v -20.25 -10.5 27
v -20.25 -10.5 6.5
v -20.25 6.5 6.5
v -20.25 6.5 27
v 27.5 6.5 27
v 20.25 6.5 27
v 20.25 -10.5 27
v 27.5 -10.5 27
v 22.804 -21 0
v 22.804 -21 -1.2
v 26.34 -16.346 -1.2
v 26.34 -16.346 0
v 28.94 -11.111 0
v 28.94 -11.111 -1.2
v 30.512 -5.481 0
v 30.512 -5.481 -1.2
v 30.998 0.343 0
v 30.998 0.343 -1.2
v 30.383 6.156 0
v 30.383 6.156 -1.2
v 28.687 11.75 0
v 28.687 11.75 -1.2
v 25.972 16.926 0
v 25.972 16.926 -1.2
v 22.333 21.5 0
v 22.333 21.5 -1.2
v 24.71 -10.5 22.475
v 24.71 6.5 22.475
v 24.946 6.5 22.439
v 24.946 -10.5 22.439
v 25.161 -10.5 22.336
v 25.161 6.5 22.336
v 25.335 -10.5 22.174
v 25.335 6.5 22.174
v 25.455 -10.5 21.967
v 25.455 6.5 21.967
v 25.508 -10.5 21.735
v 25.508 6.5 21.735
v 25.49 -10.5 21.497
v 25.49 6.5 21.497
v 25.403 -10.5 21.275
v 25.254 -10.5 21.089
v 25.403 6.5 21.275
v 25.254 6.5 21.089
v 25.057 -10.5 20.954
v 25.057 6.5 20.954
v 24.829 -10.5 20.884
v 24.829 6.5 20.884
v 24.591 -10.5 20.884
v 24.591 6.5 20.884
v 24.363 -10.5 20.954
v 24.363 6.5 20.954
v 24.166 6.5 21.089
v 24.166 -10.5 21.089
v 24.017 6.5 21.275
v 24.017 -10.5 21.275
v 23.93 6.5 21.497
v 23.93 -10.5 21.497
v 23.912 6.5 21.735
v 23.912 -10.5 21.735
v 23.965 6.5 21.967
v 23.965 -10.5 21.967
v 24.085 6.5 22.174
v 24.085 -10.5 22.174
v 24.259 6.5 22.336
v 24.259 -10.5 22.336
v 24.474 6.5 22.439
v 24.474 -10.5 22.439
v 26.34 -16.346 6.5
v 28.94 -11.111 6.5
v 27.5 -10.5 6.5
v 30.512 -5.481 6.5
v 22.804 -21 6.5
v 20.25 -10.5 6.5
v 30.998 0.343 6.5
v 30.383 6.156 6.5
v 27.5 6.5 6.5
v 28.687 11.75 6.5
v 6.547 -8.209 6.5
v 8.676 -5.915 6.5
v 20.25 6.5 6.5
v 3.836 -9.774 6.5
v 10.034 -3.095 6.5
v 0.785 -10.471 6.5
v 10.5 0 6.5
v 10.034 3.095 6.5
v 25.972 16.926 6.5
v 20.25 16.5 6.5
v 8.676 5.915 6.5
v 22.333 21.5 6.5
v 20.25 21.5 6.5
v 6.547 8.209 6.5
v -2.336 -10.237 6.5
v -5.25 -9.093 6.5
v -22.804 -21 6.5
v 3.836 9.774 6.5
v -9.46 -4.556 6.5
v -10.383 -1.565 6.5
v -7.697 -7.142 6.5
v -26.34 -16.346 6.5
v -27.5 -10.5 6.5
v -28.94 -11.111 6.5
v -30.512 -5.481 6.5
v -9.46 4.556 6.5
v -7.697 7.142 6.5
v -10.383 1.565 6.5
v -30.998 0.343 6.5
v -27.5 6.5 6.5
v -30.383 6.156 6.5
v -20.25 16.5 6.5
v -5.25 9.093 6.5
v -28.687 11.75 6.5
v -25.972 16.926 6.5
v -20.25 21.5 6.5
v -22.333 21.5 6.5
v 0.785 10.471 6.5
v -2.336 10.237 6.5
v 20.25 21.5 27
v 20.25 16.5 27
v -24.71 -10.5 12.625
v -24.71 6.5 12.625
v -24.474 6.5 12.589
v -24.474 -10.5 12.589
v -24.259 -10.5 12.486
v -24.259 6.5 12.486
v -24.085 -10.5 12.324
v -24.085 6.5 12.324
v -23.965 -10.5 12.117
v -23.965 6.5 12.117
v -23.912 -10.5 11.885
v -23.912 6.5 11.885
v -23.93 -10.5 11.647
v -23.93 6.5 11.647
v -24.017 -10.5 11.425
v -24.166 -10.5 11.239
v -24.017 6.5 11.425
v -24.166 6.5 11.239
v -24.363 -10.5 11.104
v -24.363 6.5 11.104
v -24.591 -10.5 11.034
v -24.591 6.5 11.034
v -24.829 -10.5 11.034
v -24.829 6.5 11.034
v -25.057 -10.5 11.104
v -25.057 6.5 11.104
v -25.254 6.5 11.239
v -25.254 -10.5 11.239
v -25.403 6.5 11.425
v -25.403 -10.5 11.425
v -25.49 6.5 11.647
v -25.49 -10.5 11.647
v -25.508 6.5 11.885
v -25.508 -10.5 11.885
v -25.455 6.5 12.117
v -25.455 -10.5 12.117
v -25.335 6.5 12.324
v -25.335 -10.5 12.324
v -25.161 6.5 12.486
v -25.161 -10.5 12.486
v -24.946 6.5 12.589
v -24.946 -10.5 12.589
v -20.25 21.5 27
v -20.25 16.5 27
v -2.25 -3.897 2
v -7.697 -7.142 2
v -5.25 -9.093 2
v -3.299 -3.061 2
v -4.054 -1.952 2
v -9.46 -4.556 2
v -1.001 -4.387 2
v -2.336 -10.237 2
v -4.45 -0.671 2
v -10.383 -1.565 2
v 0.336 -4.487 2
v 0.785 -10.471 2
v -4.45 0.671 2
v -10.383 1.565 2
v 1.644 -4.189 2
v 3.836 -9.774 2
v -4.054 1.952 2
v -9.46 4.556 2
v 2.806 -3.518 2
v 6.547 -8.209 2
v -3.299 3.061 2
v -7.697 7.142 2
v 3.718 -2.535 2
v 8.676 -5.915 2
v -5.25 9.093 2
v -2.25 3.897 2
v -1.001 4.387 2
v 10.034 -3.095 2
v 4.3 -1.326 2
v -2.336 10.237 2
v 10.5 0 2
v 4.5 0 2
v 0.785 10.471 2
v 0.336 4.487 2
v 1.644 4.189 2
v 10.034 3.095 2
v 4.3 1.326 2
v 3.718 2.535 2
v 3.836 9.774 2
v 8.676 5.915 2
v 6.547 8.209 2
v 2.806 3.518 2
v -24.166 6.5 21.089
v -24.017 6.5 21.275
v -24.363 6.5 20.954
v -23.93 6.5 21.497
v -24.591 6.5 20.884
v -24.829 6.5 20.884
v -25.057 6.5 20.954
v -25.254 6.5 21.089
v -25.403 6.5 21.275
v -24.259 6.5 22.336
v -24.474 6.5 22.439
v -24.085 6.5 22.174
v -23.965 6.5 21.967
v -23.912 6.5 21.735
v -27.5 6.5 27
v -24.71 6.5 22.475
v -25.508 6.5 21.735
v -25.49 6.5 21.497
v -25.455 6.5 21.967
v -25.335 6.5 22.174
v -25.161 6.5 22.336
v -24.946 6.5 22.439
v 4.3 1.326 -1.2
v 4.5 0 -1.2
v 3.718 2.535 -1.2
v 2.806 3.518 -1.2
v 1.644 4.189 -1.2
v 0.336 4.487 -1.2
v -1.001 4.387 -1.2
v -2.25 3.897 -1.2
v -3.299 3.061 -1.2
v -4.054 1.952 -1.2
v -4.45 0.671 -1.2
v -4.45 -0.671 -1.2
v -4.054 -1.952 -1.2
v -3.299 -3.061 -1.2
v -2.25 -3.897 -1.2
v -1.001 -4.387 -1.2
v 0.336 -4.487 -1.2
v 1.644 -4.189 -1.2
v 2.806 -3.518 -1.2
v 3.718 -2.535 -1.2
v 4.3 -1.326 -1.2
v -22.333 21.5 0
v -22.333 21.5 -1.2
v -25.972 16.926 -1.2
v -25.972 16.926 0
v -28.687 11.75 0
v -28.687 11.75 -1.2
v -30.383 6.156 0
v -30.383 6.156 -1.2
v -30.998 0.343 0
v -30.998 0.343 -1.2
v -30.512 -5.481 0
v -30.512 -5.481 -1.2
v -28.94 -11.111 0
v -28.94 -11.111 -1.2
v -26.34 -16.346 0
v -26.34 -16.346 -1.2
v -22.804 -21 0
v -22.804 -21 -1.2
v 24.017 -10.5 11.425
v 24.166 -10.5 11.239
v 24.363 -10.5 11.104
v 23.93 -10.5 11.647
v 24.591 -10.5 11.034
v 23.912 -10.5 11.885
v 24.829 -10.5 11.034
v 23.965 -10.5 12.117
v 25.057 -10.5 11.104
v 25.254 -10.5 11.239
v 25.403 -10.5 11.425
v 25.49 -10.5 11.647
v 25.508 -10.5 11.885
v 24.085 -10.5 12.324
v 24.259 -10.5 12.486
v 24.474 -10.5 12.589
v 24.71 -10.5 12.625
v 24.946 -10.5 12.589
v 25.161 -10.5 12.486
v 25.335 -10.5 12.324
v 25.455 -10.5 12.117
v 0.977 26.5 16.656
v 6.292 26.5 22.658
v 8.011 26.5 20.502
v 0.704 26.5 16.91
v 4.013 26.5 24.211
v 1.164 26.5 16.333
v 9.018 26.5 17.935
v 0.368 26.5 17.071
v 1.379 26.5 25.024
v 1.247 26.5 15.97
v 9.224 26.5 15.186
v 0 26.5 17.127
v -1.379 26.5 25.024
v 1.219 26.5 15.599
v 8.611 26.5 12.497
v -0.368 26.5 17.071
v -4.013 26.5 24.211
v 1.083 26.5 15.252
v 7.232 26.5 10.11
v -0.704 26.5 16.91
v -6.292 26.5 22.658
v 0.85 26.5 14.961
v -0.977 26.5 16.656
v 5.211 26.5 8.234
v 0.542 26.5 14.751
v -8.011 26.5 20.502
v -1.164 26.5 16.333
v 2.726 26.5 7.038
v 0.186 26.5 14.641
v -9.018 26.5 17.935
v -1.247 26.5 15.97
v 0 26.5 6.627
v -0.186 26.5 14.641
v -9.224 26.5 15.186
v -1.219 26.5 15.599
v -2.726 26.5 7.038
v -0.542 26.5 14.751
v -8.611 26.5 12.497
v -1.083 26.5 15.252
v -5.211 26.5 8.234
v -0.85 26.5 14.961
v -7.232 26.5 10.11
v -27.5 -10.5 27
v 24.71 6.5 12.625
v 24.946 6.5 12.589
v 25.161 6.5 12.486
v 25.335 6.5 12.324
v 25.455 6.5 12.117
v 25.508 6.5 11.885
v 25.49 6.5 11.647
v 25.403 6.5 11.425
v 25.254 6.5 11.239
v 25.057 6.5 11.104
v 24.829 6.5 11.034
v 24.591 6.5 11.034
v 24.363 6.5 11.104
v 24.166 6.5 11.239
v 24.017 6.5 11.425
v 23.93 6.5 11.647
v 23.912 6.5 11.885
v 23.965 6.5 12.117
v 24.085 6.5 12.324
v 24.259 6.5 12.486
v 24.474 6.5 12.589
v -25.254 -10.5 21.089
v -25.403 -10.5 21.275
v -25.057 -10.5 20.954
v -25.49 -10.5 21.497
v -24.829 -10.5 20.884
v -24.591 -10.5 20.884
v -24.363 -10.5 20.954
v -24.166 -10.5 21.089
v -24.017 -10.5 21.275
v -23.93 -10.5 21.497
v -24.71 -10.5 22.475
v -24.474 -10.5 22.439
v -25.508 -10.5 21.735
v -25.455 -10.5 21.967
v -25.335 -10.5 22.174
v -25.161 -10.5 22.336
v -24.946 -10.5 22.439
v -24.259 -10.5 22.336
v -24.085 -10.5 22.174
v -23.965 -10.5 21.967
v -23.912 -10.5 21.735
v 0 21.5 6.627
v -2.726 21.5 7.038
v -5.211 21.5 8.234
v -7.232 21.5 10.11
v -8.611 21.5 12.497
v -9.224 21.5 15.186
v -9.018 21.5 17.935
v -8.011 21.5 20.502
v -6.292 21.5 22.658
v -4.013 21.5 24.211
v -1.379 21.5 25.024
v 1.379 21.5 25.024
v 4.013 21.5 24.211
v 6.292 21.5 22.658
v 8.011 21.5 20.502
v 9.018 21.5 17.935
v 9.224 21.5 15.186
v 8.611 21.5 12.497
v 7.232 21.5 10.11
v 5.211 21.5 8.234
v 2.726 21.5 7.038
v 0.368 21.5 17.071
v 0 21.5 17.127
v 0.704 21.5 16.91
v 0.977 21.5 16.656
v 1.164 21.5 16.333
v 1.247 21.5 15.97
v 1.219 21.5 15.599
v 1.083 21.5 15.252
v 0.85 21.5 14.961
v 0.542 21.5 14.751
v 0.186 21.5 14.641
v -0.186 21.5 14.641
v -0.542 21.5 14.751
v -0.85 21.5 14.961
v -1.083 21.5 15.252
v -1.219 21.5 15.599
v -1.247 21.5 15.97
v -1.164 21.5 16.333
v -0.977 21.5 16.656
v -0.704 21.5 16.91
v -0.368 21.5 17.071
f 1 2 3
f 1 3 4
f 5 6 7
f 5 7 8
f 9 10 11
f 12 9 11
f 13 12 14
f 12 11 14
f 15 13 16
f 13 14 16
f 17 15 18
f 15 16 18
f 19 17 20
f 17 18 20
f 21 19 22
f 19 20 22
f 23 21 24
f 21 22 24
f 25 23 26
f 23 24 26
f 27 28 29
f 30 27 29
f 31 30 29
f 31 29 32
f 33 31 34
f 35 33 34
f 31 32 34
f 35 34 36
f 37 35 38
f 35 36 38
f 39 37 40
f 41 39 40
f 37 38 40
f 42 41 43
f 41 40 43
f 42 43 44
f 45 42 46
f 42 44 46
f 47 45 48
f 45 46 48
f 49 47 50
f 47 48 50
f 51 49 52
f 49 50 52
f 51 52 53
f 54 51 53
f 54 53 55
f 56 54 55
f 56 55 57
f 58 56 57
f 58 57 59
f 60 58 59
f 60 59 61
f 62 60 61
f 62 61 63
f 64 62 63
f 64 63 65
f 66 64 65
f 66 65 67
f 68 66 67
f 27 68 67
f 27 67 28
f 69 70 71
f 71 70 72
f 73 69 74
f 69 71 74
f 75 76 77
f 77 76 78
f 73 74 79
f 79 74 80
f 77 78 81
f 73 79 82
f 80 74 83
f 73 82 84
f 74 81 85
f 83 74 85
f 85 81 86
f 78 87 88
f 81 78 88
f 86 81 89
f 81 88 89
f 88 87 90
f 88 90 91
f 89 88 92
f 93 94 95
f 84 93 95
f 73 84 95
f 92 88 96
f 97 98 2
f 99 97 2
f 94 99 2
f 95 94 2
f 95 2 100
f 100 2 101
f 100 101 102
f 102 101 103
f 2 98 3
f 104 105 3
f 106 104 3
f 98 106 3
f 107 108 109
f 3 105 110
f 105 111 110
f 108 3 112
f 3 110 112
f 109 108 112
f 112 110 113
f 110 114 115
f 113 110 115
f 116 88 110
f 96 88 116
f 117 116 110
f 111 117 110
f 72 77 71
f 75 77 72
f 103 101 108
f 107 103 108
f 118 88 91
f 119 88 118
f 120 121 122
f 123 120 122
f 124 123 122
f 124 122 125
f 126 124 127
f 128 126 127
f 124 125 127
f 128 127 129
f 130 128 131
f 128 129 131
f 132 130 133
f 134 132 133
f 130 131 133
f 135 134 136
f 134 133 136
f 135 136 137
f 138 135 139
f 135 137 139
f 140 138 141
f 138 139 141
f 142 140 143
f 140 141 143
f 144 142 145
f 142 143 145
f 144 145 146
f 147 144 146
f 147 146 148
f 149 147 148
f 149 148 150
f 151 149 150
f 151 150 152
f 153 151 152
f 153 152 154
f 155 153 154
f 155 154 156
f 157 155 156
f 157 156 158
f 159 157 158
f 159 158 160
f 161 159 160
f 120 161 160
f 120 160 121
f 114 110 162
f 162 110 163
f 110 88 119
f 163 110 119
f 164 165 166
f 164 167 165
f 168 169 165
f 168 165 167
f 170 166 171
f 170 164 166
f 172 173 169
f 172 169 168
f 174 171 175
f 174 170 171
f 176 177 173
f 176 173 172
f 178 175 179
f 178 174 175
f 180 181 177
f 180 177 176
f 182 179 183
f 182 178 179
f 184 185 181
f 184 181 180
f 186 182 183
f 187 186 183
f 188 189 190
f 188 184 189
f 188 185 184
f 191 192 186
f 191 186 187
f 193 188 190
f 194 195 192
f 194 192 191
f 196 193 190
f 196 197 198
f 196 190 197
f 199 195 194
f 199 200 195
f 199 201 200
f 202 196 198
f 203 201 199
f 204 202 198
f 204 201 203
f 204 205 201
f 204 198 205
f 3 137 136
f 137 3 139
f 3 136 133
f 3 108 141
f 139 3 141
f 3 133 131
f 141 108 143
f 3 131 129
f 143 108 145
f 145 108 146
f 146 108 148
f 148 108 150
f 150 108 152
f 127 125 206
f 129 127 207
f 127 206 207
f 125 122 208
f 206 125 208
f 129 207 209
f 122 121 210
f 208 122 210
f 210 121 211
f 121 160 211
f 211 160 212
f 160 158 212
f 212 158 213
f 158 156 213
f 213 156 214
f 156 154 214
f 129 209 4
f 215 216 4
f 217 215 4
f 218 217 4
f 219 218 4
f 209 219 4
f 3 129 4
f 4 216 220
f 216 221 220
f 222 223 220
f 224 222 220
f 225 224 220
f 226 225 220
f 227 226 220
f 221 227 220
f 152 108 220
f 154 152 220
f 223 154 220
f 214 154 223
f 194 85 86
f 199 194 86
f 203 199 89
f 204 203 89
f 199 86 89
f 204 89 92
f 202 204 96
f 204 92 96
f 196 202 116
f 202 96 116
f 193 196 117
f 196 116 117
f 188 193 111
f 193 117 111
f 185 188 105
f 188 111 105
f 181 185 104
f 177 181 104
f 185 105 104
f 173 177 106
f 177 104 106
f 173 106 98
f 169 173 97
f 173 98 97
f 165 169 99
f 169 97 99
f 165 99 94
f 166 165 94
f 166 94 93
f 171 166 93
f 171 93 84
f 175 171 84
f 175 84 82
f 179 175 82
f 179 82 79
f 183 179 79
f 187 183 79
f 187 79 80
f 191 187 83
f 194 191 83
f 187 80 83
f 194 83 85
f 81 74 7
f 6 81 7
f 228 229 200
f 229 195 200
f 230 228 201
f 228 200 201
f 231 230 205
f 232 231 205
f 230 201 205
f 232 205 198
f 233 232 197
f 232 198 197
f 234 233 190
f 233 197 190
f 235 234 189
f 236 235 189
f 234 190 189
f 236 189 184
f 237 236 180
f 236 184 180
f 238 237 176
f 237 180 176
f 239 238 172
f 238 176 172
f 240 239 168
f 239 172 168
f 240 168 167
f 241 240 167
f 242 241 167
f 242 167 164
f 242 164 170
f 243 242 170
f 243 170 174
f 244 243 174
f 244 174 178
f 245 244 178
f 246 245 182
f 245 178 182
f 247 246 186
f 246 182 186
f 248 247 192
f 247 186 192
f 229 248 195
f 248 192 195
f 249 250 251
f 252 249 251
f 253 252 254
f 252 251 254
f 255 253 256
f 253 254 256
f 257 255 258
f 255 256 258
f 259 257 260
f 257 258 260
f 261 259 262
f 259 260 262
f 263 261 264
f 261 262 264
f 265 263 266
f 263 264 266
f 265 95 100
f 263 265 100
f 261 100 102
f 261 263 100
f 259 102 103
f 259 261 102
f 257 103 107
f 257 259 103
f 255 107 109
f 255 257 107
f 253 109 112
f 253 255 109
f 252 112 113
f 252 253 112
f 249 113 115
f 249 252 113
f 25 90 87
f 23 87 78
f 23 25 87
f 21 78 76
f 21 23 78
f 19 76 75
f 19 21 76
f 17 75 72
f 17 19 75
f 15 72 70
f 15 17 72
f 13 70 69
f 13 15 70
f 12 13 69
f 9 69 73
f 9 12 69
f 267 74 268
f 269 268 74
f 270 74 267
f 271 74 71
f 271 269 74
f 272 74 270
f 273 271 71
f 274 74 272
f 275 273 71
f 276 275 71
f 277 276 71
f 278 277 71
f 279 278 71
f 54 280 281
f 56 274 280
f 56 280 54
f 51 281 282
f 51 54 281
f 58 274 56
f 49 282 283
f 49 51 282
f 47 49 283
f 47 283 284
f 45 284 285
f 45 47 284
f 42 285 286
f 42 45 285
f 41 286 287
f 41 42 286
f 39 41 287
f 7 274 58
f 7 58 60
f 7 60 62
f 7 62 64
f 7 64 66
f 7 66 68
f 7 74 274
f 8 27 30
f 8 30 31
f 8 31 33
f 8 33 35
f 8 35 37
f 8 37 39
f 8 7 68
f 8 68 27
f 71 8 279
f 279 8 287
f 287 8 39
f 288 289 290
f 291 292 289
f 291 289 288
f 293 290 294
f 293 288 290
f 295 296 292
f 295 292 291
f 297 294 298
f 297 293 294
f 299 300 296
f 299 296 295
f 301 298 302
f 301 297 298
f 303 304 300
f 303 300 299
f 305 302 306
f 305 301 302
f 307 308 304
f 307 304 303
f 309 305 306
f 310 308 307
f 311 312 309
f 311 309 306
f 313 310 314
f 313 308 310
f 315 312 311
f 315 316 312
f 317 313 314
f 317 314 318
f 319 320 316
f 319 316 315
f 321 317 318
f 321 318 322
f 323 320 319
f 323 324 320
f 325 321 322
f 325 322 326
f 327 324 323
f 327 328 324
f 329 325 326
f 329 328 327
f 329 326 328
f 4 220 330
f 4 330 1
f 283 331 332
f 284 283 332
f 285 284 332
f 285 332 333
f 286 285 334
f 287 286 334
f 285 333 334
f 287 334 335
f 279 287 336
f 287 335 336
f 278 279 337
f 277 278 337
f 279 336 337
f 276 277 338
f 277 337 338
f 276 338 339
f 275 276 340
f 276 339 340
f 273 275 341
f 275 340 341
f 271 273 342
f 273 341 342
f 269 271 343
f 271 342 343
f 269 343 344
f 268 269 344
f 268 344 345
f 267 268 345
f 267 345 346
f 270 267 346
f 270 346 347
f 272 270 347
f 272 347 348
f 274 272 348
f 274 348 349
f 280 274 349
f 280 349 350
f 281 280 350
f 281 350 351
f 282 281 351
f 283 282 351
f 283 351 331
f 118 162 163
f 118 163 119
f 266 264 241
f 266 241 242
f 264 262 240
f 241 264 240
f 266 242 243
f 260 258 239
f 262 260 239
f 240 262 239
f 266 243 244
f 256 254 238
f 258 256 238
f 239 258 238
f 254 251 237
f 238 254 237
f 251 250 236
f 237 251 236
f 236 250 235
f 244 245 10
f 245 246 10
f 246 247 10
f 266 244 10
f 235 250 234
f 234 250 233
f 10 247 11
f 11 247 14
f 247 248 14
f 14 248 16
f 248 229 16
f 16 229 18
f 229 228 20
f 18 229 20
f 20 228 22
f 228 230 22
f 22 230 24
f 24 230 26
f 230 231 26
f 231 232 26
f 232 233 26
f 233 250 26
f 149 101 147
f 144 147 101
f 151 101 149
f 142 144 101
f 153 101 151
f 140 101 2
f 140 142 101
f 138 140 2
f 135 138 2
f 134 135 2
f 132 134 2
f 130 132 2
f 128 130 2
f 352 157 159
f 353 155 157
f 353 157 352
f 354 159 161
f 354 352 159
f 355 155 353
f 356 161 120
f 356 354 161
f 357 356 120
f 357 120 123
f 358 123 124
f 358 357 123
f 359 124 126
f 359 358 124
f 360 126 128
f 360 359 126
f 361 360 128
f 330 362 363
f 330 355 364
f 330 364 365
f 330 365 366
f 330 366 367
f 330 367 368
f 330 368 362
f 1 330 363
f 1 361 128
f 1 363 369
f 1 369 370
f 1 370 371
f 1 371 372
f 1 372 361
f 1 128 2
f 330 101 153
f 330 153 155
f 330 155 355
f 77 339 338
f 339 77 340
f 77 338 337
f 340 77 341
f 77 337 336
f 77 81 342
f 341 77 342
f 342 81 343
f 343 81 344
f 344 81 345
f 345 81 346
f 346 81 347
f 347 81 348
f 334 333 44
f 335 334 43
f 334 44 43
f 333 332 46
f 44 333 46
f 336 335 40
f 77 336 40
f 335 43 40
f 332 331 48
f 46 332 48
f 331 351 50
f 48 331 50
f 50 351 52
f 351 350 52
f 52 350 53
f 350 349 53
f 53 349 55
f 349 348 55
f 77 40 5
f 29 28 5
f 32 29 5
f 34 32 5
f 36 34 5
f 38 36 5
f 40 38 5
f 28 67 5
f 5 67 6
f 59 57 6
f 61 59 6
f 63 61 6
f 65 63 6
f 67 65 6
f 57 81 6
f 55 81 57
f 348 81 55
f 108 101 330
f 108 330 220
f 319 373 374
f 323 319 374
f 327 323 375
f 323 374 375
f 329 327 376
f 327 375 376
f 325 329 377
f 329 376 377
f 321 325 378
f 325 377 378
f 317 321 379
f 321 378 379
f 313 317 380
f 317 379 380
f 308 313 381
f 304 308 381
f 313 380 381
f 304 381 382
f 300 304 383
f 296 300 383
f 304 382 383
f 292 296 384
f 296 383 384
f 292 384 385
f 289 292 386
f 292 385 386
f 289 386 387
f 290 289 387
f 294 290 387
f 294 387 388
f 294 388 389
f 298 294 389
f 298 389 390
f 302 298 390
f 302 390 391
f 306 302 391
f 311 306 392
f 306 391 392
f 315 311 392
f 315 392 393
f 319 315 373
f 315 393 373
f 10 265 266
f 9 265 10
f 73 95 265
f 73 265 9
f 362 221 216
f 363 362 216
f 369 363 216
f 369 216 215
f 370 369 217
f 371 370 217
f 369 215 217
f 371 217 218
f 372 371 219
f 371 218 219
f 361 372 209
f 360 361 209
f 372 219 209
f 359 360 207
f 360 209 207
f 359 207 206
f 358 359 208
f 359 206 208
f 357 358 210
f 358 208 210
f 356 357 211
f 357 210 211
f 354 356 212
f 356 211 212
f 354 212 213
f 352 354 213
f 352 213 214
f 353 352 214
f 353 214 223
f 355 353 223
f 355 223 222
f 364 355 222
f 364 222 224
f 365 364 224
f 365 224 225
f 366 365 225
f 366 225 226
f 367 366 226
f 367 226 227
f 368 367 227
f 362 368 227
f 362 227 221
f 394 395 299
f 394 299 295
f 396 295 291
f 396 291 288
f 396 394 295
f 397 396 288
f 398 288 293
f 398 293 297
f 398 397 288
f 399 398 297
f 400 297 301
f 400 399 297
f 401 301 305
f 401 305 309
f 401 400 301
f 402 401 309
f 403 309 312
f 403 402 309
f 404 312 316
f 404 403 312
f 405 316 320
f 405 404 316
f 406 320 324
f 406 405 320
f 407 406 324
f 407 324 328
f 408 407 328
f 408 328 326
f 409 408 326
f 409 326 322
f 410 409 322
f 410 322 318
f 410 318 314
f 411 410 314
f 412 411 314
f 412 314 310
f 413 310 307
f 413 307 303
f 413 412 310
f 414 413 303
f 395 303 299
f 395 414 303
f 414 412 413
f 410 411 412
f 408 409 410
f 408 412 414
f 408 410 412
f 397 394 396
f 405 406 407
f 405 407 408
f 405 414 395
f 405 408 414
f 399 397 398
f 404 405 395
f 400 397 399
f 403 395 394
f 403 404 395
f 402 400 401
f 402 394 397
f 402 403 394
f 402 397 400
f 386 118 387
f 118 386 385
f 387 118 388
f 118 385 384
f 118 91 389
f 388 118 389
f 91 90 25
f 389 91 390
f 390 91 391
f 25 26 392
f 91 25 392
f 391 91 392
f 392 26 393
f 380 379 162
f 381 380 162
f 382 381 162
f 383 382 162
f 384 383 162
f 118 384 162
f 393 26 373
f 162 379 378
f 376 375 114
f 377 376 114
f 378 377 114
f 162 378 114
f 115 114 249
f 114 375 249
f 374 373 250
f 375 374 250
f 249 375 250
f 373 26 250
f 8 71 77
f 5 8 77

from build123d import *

# Parameters (mm, degrees)
ESQUISSE1_W              = 55
ESQUISSE1_H              = 43
BOSS_EXTRU_1_DEPTH       = 27
ESQUISSE2_W              = 40.5
ESQUISSE2_H              = 21.676575317
ENL_V_MAT_EXTRU_1_DEPTH  = 38
ESQUISSE3_R              = 0.7
ENL_V_MAT_EXTRU_2_DEPTH  = 43
ESQUISSE4_W              = 55
ESQUISSE4_H              = 20.5
ENL_V_MAT_EXTRU_3_DEPTH  = 11
ENL_V_MAT_EXTRU_6_REACH  = 66.933
ESQUISSE5_W              = 20.5
ESQUISSE5_H              = 10
ESQUISSE6_W              = 7.25
ESQUISSE6_H              = 20.5
ENL_V_MAT_EXTRU_7_DEPTH  = 5
ESQUISSE7_R              = 31
BOSS_EXTRU_2_DEPTH       = 6.5
ESQUISSE8_R              = 41
ESQUISSE8_R_2            = 31
ENL_V_MAT_EXTRU_8_DEPTH  = 6.5
TROU_TARAUD_M2X0_41_D    = 1.6
ESQUISSE10_R             = 10.5
ENL_V_MAT_EXTRU_9_DEPTH  = 4.5
ESQUISSE11_R             = 4.5
ENL_V_MAT_EXTRU_10_DEPTH = 2
ESQUISSE12_R             = 9.25
ESQUISSE12_R_2           = 1.25
BOSS_EXTRU_3_DEPTH       = 5
ESQUISSE13_W             = 50.114904395
ESQUISSE13_H             = 12.012600019
ENL_V_MAT_EXTRU_11_DEPTH = 6.5
BOSS_EXTRU_4_START       = 1.2
BOSS_EXTRU_4_DEPTH       = 1.2
ESQUISSE15_W             = 53.005482756
ESQUISSE15_H             = 10
ENL_V_MAT_EXTRU_12_DEPTH = 7.7
ESQUISSE16_R             = 4.5
ENL_V_MAT_EXTRU_13_DEPTH = 1.2


with BuildPart() as part:
    # Esquisse1 → Boss.-Extru.1 (new body)
    with BuildSketch(Plane.XY):
        Rectangle(ESQUISSE1_W, ESQUISSE1_H)
    extrude(amount=BOSS_EXTRU_1_DEPTH)

    # Esquisse2 → Enlèv. mat.-Extru.1 (cut)
    with BuildSketch(Plane.XZ.offset(21.5)):
        with Locations((0, 17.338287659)):
            Rectangle(ESQUISSE2_W, ESQUISSE2_H)
    extrude(amount=-ENL_V_MAT_EXTRU_1_DEPTH, mode=Mode.SUBTRACT)

    # Esquisse3 → Enlèv. mat.-Extru.2 (cut)
    with BuildSketch(Plane.XZ.offset(21.5)):
        with Locations(Location((-24.71, 21.675, 0), (0, 0, 270))):
            Circle(ESQUISSE3_R)
        with Locations(Location((-24.71, 11.825, 0), (0, 0, 270))):
            Circle(ESQUISSE3_R)
        with Locations(Location((24.71, 11.825, 0), (0, 0, 270))):
            Circle(ESQUISSE3_R)
        with Locations(Location((24.71, 21.675, 0), (0, 0, 270))):
            Circle(ESQUISSE3_R)
    extrude(amount=-ENL_V_MAT_EXTRU_2_DEPTH, mode=Mode.SUBTRACT)

    # Esquisse4 → Enlèv. mat.-Extru.3 (cut)
    with BuildSketch(Plane.XZ.offset(21.5)):
        with Locations((0, 16.75)):
            Rectangle(ESQUISSE4_W, ESQUISSE4_H)
    extrude(amount=-ENL_V_MAT_EXTRU_3_DEPTH, mode=Mode.SUBTRACT)

    # Enlèv. mat.-Extru.6: up to this face of the body (flat: up to its plane)
    enl_v_mat_extru_6_end = Plane(part.part.faces().sort_by_distance((27.5, 3.85676109, 12.716595404))[0])
    # Esquisse5 → Enlèv. mat.-Extru.6 (cut, up to the picked face)
    with BuildSketch(Plane.ZY.offset(27.5), mode=Mode.PRIVATE) as enl_v_mat_extru_6_sk1:
        with Locations((16.75, 11.5)):
            Rectangle(ESQUISSE5_W, ESQUISSE5_H)
    enl_v_mat_extru_6_tool1 = split(extrude(enl_v_mat_extru_6_sk1.sketch, amount=-ENL_V_MAT_EXTRU_6_REACH, mode=Mode.PRIVATE), bisect_by=enl_v_mat_extru_6_end, keep=Keep.BOTH, mode=Mode.PRIVATE)
    add(enl_v_mat_extru_6_tool1.solids().sort_by(Axis((-27.5, 11.5, 16.75), (1, 0, 0)))[0], mode=Mode.SUBTRACT)

    # Esquisse6 → Enlèv. mat.-Extru.7 (cut)
    with BuildSketch(Plane.XZ.offset(-16.5)):
        with Locations((-23.875, 16.75)):
            Rectangle(ESQUISSE6_W, ESQUISSE6_H)
        with Locations((23.875, 16.75)):
            Rectangle(ESQUISSE6_W, ESQUISSE6_H)
    extrude(amount=-ENL_V_MAT_EXTRU_7_DEPTH, mode=Mode.SUBTRACT)

    # Esquisse7 → Boss.-Extru.2 (add)
    with BuildSketch(Plane(origin=(0, 0, 0), x_dir=(-1, 0, 0), z_dir=(0, 0, -1))):
        Circle(ESQUISSE7_R)
    extrude(amount=-BOSS_EXTRU_2_DEPTH)

    # Esquisse8 → Enlèv. mat.-Extru.8 (cut)
    with BuildSketch(Plane(origin=(0, 0, 0), x_dir=(-1, 0, 0), z_dir=(0, 0, -1))):
        Circle(ESQUISSE8_R)
        Circle(ESQUISSE8_R_2, mode=Mode.SUBTRACT)
    extrude(amount=-ENL_V_MAT_EXTRU_8_DEPTH, mode=Mode.SUBTRACT)

    # Trou taraudé M2x0.41 (through all)
    with Locations(Plane(origin=(-24.71, -10.5, 21.675), x_dir=(0, 0, -1), z_dir=(0, -1, 0))):
        with Locations((0, 0), (9.85, 0), (0, 49.42), (9.85, 49.42)):
            Hole(TROU_TARAUD_M2X0_41_D / 2)

    # Esquisse10 → Enlèv. mat.-Extru.9 (cut)
    with BuildSketch(Plane.XY.offset(6.5)):
        Circle(ESQUISSE10_R)
    extrude(amount=-ENL_V_MAT_EXTRU_9_DEPTH, mode=Mode.SUBTRACT)

    # Esquisse11 → Enlèv. mat.-Extru.10 (cut)
    with BuildSketch(Plane.XY.offset(2)):
        Circle(ESQUISSE11_R)
    extrude(amount=-ENL_V_MAT_EXTRU_10_DEPTH, mode=Mode.SUBTRACT)

    # Esquisse12 → Boss.-Extru.3 (add)
    with BuildSketch(Plane(origin=(0, 21.5, 0), x_dir=(1, 0, 0), z_dir=(0, 1, 0))):
        with Locations(Location((0, -15.876822983, 0), (0, 0, 90))):
            Circle(ESQUISSE12_R)
        with Locations(Location((0, -15.876822983, 0), (0, 0, 270))):
            Circle(ESQUISSE12_R_2, mode=Mode.SUBTRACT)
    extrude(amount=BOSS_EXTRU_3_DEPTH)

    # Esquisse13 → Enlèv. mat.-Extru.11 (cut)
    with BuildSketch(Plane.XY.offset(6.5)):
        with Locations((-0.983340997, 27.50630001)):
            Rectangle(ESQUISSE13_W, ESQUISSE13_H)
    extrude(amount=-ENL_V_MAT_EXTRU_11_DEPTH, mode=Mode.SUBTRACT)

    # Esquisse14 → Boss.-Extru.4 (add)
    with BuildSketch(Plane(origin=(0, 0, 0), x_dir=(-1, 0, 0), z_dir=(0, 0, -1)).offset(BOSS_EXTRU_4_START)):
        with BuildLine():
            Line((-22.332711434, 21.5), (22.332711434, 21.5))
            ThreePointArc((22.332711434, 21.5), (0, -31), (-22.332711434, 21.5))
        make_face()
    extrude(amount=-BOSS_EXTRU_4_DEPTH)

    # Esquisse15 → Enlèv. mat.-Extru.12 (cut)
    with BuildSketch(Plane.XY.offset(6.5)):
        with Locations((0, -26)):
            Rectangle(ESQUISSE15_W, ESQUISSE15_H)
    extrude(amount=-ENL_V_MAT_EXTRU_12_DEPTH, mode=Mode.SUBTRACT)

    # Esquisse16 → Enlèv. mat.-Extru.13 (cut)
    with BuildSketch(Plane.XY):
        Circle(ESQUISSE16_R)
    extrude(amount=-ENL_V_MAT_EXTRU_13_DEPTH, mode=Mode.SUBTRACT)


solid = part.part
